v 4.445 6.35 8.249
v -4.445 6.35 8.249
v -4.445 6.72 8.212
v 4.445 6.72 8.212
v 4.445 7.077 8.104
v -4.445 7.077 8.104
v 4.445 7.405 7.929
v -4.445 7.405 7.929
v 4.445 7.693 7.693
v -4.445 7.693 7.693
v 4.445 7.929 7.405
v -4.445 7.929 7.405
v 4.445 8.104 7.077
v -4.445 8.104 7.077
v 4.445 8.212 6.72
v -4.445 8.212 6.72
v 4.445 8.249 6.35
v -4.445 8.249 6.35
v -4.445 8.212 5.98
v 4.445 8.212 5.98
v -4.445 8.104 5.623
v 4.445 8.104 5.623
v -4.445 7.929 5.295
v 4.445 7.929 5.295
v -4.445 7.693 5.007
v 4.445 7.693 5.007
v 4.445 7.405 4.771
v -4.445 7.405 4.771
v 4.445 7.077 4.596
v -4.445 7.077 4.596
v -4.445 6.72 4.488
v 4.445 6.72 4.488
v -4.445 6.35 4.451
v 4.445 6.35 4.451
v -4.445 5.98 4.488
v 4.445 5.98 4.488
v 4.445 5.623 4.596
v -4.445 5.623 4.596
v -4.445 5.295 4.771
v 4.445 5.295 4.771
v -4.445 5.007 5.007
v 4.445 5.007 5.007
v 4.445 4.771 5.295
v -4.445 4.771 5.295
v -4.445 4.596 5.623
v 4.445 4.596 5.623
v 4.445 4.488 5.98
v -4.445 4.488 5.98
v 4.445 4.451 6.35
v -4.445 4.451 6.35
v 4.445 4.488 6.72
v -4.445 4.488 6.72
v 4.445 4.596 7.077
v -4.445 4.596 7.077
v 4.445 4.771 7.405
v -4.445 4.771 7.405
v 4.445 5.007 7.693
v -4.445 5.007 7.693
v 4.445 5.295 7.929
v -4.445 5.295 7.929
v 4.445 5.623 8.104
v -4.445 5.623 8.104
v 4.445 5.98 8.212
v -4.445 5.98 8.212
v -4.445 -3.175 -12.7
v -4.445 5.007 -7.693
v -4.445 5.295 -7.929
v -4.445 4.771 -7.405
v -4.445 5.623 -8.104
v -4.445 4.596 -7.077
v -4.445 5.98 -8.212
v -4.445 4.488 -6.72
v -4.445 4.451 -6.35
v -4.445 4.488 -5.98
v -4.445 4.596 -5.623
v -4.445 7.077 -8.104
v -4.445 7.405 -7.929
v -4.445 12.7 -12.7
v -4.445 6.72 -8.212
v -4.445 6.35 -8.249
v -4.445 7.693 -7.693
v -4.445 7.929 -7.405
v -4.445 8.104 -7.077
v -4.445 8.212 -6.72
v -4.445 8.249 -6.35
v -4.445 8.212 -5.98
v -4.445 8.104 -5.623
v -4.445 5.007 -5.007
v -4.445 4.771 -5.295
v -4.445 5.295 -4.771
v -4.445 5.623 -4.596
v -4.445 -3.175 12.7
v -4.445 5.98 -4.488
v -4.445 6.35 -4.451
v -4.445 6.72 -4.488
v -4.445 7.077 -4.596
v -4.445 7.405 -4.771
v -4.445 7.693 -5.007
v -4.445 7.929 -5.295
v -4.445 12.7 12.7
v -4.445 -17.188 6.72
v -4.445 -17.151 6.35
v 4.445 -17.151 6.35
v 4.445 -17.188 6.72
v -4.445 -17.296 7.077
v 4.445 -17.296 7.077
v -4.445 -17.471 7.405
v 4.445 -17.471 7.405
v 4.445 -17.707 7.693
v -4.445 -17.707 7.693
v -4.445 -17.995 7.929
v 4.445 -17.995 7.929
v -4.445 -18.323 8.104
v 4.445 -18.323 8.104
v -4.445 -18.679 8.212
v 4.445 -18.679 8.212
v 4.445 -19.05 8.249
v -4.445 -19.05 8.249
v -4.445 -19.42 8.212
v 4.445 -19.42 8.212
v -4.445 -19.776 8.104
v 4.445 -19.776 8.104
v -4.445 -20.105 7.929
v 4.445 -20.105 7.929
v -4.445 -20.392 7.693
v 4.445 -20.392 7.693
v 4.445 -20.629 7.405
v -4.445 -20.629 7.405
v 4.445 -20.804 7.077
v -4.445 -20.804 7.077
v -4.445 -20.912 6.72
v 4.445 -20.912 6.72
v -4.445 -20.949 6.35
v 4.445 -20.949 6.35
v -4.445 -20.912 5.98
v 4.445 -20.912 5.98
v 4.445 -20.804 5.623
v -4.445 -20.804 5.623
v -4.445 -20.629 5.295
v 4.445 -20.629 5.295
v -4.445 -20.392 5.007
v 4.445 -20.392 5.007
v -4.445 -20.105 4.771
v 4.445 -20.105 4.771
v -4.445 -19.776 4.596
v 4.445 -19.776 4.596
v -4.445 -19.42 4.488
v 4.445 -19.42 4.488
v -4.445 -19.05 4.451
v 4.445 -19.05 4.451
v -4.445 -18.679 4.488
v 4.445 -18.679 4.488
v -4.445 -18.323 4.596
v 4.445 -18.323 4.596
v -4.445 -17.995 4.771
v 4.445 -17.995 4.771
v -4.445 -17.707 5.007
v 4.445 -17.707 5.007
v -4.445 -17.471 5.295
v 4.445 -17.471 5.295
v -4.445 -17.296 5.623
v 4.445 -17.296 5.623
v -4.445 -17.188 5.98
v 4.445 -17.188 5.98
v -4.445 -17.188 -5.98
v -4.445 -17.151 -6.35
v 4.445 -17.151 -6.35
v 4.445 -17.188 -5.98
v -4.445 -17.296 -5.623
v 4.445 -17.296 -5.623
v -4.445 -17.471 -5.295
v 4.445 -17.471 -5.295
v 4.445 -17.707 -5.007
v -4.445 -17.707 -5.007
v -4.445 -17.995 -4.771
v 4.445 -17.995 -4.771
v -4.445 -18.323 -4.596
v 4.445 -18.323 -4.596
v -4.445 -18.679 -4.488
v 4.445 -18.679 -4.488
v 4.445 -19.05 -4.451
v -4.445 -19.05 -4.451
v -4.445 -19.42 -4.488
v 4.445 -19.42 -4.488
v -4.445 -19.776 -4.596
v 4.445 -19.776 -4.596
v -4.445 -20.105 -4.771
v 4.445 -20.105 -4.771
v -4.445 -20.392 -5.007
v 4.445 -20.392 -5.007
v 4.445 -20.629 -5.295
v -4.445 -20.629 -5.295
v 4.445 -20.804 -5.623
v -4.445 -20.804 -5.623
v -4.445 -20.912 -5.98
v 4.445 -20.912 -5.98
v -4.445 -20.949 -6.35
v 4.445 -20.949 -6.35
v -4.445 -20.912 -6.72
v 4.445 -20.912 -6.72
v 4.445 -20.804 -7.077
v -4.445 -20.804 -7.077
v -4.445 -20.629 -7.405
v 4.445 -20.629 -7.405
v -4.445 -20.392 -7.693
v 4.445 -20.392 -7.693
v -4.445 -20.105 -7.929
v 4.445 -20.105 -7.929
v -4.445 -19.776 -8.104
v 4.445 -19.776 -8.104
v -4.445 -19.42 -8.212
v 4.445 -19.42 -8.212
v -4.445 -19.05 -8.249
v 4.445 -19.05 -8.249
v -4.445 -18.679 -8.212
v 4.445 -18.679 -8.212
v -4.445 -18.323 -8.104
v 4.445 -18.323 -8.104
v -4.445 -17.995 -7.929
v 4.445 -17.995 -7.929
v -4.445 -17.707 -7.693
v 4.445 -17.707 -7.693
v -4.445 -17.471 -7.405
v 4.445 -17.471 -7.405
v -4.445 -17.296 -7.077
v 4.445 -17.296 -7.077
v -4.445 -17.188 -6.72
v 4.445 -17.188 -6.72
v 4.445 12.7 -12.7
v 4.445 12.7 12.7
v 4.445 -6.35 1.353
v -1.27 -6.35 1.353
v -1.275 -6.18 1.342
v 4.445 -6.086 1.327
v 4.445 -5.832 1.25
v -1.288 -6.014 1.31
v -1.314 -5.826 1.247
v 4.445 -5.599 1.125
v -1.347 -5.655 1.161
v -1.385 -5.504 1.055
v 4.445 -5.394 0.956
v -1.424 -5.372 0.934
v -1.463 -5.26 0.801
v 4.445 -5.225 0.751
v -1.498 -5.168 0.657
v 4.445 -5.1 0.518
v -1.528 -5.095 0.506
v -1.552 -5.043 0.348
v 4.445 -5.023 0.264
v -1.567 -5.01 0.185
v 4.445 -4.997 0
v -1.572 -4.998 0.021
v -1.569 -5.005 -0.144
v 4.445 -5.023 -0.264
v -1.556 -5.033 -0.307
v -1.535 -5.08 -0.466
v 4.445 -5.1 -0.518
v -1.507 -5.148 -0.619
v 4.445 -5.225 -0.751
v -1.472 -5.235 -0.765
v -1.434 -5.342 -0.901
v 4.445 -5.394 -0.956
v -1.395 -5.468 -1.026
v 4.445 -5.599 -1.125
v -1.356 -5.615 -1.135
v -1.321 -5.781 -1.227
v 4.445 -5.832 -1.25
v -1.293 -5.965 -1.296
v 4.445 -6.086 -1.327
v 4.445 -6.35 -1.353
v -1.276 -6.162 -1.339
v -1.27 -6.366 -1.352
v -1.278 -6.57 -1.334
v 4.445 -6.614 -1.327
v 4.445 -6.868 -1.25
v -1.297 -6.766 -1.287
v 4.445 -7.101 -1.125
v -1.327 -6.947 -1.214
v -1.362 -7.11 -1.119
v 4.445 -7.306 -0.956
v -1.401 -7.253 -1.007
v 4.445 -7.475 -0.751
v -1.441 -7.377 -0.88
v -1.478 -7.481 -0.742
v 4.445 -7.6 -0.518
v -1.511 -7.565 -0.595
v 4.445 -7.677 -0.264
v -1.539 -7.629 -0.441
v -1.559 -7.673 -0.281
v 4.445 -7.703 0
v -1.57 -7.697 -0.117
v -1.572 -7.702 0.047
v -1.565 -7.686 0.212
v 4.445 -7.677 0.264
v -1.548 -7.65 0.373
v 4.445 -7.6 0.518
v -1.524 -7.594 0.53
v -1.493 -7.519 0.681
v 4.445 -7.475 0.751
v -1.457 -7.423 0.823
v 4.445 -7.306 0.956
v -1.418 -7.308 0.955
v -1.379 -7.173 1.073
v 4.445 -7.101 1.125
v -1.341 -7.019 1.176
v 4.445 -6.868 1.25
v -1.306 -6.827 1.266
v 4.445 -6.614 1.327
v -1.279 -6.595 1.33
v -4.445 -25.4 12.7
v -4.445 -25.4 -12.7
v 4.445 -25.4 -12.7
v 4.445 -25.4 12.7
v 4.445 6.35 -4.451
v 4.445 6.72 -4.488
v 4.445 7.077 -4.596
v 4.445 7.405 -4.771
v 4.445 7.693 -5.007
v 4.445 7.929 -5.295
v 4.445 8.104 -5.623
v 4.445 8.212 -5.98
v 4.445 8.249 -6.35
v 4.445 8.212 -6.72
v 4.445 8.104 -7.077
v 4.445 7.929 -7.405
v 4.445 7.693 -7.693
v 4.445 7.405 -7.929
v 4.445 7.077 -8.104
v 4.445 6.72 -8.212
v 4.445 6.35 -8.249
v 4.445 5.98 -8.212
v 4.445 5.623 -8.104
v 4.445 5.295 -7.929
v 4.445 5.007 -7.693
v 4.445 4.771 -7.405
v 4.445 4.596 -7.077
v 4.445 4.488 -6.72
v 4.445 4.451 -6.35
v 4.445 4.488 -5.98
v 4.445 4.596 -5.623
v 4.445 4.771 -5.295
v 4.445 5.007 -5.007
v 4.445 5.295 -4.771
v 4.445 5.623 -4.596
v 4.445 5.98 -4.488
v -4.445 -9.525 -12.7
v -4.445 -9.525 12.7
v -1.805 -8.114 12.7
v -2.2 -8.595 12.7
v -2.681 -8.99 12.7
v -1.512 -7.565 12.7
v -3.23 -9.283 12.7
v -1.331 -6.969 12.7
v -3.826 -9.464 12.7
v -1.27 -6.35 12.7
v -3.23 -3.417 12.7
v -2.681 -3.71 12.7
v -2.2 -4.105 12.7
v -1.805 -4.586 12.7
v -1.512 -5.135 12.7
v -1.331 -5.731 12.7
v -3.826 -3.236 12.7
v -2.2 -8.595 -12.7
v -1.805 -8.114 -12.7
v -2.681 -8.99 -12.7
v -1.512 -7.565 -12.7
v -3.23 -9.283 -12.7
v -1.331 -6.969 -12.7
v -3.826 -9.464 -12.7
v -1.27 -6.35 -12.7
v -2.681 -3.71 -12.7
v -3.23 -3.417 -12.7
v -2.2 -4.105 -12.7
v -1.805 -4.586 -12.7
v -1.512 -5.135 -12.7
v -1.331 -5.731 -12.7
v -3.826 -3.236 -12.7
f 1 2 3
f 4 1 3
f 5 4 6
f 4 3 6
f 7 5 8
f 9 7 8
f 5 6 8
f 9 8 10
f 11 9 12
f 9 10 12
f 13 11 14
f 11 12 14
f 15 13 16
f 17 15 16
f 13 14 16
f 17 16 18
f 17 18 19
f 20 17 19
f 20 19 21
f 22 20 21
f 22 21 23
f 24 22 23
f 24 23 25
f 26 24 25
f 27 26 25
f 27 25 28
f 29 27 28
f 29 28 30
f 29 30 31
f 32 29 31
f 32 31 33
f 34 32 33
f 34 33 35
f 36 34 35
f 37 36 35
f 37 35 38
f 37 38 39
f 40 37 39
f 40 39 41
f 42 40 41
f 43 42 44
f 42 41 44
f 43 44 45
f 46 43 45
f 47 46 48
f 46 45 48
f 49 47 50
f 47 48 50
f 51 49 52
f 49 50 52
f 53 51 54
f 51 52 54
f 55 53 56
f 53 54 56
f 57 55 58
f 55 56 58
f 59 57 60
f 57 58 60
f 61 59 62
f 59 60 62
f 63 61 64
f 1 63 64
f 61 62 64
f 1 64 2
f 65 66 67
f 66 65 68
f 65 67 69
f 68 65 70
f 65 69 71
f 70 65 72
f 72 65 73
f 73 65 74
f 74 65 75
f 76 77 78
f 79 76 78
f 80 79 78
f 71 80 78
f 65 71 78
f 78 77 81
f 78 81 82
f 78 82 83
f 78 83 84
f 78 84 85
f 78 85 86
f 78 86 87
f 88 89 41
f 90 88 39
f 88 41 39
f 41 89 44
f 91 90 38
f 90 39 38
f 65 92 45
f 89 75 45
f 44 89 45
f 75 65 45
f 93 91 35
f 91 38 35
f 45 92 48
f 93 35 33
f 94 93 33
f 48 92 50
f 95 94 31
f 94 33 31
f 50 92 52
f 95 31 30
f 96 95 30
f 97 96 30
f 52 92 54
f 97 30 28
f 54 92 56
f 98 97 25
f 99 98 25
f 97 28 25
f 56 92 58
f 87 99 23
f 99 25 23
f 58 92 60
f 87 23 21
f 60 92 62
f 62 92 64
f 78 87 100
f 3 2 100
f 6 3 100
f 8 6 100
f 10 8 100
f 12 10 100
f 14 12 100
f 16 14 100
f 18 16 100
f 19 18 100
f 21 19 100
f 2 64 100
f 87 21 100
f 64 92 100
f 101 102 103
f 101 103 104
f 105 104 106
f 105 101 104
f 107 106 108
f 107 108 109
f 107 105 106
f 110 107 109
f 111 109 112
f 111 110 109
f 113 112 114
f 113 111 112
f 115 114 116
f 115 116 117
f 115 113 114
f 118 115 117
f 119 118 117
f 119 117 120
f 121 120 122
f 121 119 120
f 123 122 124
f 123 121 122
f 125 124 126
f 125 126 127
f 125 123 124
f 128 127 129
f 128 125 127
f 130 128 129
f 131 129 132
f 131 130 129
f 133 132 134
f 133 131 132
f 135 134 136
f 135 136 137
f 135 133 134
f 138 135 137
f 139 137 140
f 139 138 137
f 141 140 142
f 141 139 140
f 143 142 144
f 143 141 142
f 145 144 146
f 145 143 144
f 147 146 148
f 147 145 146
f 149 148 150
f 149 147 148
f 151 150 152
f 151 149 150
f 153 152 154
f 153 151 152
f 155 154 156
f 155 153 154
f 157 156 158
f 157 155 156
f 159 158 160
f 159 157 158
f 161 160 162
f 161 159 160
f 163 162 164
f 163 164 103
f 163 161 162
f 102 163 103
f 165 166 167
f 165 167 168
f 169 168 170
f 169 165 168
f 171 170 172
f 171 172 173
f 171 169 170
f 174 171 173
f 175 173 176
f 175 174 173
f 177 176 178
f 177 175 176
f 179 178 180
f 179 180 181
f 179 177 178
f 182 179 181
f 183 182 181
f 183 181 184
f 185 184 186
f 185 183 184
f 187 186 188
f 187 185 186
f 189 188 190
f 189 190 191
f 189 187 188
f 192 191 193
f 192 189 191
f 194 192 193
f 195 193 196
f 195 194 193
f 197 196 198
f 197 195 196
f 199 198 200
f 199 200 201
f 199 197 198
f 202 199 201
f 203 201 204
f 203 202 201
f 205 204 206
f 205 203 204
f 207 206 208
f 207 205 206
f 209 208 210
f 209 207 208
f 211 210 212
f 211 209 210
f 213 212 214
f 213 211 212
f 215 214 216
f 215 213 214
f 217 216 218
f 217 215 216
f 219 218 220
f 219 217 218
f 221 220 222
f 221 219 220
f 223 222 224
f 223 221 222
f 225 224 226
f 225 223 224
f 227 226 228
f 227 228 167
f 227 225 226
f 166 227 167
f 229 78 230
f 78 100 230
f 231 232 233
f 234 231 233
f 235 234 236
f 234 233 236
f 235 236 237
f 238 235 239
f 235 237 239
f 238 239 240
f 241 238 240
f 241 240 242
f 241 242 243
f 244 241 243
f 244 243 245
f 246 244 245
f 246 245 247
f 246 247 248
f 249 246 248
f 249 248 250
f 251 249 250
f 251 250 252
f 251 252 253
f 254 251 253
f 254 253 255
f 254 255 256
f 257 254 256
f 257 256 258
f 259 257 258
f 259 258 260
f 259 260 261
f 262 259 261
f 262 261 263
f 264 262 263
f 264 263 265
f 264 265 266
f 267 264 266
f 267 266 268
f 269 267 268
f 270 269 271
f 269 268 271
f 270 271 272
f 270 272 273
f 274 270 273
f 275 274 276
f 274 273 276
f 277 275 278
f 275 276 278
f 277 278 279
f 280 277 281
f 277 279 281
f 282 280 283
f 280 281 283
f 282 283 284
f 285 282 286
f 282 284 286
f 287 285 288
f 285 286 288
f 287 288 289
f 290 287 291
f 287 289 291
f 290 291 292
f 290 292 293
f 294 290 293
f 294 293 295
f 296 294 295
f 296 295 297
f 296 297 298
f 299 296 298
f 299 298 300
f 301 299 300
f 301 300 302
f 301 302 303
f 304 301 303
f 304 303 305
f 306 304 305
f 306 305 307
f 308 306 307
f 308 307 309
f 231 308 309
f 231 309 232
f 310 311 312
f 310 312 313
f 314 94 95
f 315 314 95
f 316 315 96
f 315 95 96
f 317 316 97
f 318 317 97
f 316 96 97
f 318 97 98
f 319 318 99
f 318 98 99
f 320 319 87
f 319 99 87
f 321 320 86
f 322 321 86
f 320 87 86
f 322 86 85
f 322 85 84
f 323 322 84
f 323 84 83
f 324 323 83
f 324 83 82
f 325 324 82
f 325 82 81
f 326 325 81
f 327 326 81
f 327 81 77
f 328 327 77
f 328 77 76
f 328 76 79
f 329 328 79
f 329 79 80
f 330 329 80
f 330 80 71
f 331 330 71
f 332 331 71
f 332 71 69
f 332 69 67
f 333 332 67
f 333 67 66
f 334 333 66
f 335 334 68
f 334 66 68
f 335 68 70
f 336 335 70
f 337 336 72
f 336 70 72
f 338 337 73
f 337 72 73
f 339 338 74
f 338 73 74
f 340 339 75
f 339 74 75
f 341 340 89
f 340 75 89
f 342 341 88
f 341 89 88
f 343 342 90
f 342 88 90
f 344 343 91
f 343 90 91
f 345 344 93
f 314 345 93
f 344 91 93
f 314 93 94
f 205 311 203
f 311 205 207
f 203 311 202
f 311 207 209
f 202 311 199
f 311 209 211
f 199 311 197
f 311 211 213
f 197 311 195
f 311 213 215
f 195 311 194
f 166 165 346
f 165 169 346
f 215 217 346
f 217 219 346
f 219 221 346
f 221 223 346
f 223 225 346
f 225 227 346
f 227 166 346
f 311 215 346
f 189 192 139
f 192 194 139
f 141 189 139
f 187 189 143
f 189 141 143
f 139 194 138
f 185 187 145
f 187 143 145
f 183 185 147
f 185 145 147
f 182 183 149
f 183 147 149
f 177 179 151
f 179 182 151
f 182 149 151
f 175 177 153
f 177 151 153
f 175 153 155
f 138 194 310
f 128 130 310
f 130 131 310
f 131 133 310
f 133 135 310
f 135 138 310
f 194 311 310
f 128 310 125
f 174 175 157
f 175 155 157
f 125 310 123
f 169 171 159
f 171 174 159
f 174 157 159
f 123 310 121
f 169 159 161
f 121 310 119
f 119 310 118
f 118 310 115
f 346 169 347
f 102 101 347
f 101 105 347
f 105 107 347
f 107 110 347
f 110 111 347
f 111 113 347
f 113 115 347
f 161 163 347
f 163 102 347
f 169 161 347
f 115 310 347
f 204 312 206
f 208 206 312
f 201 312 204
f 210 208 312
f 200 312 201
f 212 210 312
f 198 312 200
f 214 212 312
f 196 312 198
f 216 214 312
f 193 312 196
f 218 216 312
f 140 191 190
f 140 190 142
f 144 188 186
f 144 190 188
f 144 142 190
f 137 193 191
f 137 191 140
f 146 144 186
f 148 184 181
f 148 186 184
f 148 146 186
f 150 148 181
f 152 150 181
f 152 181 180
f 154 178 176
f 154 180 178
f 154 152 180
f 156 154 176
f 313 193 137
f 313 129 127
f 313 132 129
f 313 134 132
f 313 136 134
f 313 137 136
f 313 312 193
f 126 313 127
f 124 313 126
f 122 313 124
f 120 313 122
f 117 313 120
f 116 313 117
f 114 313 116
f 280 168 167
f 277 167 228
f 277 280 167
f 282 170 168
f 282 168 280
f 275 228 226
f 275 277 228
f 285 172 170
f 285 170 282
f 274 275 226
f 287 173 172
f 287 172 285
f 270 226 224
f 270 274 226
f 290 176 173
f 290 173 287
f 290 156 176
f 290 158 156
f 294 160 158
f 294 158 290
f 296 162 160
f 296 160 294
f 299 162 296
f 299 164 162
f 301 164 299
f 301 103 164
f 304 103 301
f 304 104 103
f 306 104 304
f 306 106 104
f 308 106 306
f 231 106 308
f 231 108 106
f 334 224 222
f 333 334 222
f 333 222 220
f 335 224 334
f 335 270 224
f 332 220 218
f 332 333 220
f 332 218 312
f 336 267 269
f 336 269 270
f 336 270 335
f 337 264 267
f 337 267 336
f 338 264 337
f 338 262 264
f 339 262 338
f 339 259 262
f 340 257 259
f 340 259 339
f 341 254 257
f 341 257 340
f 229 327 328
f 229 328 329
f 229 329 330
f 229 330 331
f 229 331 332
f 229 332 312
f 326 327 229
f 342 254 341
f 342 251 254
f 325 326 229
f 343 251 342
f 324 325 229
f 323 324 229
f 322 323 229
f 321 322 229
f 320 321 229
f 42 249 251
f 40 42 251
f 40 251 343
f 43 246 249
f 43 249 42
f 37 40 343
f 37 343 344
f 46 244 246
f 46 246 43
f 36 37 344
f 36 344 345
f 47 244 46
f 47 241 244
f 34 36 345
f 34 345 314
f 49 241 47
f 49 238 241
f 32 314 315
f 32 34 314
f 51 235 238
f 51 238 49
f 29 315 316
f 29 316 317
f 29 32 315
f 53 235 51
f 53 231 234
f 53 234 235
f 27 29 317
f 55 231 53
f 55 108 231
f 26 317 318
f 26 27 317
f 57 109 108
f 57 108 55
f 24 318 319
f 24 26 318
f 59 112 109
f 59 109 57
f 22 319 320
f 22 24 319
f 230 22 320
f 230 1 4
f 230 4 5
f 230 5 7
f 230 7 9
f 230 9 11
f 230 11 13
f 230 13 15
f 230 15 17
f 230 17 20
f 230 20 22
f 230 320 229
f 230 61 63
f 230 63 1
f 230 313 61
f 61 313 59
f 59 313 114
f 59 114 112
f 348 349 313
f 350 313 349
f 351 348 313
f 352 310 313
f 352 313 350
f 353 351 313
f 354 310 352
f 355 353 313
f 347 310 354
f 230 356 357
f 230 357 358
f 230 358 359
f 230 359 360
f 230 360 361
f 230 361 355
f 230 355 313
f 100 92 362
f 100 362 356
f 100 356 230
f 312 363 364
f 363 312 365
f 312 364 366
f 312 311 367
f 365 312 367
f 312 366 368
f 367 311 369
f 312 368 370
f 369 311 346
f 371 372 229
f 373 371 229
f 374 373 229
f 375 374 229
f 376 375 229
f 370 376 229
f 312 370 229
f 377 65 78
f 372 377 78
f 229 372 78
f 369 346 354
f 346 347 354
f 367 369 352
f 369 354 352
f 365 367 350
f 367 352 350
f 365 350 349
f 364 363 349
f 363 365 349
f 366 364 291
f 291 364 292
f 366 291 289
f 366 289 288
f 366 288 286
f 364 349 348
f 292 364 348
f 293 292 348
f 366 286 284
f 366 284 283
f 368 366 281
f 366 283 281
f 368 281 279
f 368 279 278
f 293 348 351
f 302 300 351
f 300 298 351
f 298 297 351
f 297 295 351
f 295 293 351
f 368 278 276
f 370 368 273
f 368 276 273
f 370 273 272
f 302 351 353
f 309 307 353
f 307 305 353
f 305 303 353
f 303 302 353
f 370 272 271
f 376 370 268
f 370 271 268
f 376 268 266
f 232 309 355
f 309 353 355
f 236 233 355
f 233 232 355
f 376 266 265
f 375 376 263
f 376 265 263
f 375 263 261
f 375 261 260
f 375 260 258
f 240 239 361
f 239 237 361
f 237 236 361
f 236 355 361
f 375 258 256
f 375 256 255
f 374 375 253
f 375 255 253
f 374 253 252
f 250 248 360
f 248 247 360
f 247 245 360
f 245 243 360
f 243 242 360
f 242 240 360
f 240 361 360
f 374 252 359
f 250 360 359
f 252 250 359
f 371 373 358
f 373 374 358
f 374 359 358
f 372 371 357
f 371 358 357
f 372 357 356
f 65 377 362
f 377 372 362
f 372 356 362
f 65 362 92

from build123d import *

# Parameters (mm, degrees)
SKETCH1_W             = 8.89
SKETCH1_H             = 25.4
BOSS_EXTRUDE1_DEPTH   = 12.7
SKETCH2_R             = 3.175
CUT_EXTRUDE1_DEPTH    = 25.4
F_6_CLEARANCE_HOLE2_D = 3.7973
F_6_32_TAPPED_HOLE1_D = 2.7051


with BuildPart() as part:
    # Sketch1 → Boss-Extrude1 (new, symmetric)
    with BuildSketch(Plane.XY):
        Rectangle(SKETCH1_W, SKETCH1_H)
    boss_extrude1 = extrude(amount=BOSS_EXTRUDE1_DEPTH, both=True)

    # Sketch2 → Cut-Extrude1 (cut)
    with BuildSketch(Plane.XY.offset(12.7)):
        with Locations((-4.445, -6.35)):
            Circle(SKETCH2_R)
    cut_extrude1 = extrude(amount=-CUT_EXTRUDE1_DEPTH, mode=Mode.SUBTRACT)

    # #6 Clearance Hole2 (through all)
    with Locations(Plane(origin=(4.445, 0, 0), x_dir=(0, 0, -1), z_dir=(1, 0, 0))):
        with Locations((-6.35, 6.35), (6.35, 6.35)):
            f_6_clearance_hole2 = Hole(F_6_CLEARANCE_HOLE2_D / 2)

    # #6-32 Tapped Hole1 (through all)
    with Locations(Plane(origin=(4.445, 0, 0), x_dir=(0, 0, -1), z_dir=(1, 0, 0))):
        with Locations((0, -6.35)):
            f_6_32_tapped_hole1 = Hole(F_6_32_TAPPED_HOLE1_D / 2)

    # Mirror1: Boss-Extrude1, Cut-Extrude1, #6 Clearance Hole2, #6-32 Tapped Hole1 across plane
    add(boss_extrude1.mirror(Plane.ZX.offset(-6.349943242)))
    add(cut_extrude1.mirror(Plane.ZX.offset(-6.349943242)), mode=Mode.SUBTRACT)
    add(f_6_clearance_hole2.mirror(Plane.ZX.offset(-6.349943242)), mode=Mode.SUBTRACT)
    add(f_6_32_tapped_hole1.mirror(Plane.ZX.offset(-6.349943242)), mode=Mode.SUBTRACT)


solid = part.part
